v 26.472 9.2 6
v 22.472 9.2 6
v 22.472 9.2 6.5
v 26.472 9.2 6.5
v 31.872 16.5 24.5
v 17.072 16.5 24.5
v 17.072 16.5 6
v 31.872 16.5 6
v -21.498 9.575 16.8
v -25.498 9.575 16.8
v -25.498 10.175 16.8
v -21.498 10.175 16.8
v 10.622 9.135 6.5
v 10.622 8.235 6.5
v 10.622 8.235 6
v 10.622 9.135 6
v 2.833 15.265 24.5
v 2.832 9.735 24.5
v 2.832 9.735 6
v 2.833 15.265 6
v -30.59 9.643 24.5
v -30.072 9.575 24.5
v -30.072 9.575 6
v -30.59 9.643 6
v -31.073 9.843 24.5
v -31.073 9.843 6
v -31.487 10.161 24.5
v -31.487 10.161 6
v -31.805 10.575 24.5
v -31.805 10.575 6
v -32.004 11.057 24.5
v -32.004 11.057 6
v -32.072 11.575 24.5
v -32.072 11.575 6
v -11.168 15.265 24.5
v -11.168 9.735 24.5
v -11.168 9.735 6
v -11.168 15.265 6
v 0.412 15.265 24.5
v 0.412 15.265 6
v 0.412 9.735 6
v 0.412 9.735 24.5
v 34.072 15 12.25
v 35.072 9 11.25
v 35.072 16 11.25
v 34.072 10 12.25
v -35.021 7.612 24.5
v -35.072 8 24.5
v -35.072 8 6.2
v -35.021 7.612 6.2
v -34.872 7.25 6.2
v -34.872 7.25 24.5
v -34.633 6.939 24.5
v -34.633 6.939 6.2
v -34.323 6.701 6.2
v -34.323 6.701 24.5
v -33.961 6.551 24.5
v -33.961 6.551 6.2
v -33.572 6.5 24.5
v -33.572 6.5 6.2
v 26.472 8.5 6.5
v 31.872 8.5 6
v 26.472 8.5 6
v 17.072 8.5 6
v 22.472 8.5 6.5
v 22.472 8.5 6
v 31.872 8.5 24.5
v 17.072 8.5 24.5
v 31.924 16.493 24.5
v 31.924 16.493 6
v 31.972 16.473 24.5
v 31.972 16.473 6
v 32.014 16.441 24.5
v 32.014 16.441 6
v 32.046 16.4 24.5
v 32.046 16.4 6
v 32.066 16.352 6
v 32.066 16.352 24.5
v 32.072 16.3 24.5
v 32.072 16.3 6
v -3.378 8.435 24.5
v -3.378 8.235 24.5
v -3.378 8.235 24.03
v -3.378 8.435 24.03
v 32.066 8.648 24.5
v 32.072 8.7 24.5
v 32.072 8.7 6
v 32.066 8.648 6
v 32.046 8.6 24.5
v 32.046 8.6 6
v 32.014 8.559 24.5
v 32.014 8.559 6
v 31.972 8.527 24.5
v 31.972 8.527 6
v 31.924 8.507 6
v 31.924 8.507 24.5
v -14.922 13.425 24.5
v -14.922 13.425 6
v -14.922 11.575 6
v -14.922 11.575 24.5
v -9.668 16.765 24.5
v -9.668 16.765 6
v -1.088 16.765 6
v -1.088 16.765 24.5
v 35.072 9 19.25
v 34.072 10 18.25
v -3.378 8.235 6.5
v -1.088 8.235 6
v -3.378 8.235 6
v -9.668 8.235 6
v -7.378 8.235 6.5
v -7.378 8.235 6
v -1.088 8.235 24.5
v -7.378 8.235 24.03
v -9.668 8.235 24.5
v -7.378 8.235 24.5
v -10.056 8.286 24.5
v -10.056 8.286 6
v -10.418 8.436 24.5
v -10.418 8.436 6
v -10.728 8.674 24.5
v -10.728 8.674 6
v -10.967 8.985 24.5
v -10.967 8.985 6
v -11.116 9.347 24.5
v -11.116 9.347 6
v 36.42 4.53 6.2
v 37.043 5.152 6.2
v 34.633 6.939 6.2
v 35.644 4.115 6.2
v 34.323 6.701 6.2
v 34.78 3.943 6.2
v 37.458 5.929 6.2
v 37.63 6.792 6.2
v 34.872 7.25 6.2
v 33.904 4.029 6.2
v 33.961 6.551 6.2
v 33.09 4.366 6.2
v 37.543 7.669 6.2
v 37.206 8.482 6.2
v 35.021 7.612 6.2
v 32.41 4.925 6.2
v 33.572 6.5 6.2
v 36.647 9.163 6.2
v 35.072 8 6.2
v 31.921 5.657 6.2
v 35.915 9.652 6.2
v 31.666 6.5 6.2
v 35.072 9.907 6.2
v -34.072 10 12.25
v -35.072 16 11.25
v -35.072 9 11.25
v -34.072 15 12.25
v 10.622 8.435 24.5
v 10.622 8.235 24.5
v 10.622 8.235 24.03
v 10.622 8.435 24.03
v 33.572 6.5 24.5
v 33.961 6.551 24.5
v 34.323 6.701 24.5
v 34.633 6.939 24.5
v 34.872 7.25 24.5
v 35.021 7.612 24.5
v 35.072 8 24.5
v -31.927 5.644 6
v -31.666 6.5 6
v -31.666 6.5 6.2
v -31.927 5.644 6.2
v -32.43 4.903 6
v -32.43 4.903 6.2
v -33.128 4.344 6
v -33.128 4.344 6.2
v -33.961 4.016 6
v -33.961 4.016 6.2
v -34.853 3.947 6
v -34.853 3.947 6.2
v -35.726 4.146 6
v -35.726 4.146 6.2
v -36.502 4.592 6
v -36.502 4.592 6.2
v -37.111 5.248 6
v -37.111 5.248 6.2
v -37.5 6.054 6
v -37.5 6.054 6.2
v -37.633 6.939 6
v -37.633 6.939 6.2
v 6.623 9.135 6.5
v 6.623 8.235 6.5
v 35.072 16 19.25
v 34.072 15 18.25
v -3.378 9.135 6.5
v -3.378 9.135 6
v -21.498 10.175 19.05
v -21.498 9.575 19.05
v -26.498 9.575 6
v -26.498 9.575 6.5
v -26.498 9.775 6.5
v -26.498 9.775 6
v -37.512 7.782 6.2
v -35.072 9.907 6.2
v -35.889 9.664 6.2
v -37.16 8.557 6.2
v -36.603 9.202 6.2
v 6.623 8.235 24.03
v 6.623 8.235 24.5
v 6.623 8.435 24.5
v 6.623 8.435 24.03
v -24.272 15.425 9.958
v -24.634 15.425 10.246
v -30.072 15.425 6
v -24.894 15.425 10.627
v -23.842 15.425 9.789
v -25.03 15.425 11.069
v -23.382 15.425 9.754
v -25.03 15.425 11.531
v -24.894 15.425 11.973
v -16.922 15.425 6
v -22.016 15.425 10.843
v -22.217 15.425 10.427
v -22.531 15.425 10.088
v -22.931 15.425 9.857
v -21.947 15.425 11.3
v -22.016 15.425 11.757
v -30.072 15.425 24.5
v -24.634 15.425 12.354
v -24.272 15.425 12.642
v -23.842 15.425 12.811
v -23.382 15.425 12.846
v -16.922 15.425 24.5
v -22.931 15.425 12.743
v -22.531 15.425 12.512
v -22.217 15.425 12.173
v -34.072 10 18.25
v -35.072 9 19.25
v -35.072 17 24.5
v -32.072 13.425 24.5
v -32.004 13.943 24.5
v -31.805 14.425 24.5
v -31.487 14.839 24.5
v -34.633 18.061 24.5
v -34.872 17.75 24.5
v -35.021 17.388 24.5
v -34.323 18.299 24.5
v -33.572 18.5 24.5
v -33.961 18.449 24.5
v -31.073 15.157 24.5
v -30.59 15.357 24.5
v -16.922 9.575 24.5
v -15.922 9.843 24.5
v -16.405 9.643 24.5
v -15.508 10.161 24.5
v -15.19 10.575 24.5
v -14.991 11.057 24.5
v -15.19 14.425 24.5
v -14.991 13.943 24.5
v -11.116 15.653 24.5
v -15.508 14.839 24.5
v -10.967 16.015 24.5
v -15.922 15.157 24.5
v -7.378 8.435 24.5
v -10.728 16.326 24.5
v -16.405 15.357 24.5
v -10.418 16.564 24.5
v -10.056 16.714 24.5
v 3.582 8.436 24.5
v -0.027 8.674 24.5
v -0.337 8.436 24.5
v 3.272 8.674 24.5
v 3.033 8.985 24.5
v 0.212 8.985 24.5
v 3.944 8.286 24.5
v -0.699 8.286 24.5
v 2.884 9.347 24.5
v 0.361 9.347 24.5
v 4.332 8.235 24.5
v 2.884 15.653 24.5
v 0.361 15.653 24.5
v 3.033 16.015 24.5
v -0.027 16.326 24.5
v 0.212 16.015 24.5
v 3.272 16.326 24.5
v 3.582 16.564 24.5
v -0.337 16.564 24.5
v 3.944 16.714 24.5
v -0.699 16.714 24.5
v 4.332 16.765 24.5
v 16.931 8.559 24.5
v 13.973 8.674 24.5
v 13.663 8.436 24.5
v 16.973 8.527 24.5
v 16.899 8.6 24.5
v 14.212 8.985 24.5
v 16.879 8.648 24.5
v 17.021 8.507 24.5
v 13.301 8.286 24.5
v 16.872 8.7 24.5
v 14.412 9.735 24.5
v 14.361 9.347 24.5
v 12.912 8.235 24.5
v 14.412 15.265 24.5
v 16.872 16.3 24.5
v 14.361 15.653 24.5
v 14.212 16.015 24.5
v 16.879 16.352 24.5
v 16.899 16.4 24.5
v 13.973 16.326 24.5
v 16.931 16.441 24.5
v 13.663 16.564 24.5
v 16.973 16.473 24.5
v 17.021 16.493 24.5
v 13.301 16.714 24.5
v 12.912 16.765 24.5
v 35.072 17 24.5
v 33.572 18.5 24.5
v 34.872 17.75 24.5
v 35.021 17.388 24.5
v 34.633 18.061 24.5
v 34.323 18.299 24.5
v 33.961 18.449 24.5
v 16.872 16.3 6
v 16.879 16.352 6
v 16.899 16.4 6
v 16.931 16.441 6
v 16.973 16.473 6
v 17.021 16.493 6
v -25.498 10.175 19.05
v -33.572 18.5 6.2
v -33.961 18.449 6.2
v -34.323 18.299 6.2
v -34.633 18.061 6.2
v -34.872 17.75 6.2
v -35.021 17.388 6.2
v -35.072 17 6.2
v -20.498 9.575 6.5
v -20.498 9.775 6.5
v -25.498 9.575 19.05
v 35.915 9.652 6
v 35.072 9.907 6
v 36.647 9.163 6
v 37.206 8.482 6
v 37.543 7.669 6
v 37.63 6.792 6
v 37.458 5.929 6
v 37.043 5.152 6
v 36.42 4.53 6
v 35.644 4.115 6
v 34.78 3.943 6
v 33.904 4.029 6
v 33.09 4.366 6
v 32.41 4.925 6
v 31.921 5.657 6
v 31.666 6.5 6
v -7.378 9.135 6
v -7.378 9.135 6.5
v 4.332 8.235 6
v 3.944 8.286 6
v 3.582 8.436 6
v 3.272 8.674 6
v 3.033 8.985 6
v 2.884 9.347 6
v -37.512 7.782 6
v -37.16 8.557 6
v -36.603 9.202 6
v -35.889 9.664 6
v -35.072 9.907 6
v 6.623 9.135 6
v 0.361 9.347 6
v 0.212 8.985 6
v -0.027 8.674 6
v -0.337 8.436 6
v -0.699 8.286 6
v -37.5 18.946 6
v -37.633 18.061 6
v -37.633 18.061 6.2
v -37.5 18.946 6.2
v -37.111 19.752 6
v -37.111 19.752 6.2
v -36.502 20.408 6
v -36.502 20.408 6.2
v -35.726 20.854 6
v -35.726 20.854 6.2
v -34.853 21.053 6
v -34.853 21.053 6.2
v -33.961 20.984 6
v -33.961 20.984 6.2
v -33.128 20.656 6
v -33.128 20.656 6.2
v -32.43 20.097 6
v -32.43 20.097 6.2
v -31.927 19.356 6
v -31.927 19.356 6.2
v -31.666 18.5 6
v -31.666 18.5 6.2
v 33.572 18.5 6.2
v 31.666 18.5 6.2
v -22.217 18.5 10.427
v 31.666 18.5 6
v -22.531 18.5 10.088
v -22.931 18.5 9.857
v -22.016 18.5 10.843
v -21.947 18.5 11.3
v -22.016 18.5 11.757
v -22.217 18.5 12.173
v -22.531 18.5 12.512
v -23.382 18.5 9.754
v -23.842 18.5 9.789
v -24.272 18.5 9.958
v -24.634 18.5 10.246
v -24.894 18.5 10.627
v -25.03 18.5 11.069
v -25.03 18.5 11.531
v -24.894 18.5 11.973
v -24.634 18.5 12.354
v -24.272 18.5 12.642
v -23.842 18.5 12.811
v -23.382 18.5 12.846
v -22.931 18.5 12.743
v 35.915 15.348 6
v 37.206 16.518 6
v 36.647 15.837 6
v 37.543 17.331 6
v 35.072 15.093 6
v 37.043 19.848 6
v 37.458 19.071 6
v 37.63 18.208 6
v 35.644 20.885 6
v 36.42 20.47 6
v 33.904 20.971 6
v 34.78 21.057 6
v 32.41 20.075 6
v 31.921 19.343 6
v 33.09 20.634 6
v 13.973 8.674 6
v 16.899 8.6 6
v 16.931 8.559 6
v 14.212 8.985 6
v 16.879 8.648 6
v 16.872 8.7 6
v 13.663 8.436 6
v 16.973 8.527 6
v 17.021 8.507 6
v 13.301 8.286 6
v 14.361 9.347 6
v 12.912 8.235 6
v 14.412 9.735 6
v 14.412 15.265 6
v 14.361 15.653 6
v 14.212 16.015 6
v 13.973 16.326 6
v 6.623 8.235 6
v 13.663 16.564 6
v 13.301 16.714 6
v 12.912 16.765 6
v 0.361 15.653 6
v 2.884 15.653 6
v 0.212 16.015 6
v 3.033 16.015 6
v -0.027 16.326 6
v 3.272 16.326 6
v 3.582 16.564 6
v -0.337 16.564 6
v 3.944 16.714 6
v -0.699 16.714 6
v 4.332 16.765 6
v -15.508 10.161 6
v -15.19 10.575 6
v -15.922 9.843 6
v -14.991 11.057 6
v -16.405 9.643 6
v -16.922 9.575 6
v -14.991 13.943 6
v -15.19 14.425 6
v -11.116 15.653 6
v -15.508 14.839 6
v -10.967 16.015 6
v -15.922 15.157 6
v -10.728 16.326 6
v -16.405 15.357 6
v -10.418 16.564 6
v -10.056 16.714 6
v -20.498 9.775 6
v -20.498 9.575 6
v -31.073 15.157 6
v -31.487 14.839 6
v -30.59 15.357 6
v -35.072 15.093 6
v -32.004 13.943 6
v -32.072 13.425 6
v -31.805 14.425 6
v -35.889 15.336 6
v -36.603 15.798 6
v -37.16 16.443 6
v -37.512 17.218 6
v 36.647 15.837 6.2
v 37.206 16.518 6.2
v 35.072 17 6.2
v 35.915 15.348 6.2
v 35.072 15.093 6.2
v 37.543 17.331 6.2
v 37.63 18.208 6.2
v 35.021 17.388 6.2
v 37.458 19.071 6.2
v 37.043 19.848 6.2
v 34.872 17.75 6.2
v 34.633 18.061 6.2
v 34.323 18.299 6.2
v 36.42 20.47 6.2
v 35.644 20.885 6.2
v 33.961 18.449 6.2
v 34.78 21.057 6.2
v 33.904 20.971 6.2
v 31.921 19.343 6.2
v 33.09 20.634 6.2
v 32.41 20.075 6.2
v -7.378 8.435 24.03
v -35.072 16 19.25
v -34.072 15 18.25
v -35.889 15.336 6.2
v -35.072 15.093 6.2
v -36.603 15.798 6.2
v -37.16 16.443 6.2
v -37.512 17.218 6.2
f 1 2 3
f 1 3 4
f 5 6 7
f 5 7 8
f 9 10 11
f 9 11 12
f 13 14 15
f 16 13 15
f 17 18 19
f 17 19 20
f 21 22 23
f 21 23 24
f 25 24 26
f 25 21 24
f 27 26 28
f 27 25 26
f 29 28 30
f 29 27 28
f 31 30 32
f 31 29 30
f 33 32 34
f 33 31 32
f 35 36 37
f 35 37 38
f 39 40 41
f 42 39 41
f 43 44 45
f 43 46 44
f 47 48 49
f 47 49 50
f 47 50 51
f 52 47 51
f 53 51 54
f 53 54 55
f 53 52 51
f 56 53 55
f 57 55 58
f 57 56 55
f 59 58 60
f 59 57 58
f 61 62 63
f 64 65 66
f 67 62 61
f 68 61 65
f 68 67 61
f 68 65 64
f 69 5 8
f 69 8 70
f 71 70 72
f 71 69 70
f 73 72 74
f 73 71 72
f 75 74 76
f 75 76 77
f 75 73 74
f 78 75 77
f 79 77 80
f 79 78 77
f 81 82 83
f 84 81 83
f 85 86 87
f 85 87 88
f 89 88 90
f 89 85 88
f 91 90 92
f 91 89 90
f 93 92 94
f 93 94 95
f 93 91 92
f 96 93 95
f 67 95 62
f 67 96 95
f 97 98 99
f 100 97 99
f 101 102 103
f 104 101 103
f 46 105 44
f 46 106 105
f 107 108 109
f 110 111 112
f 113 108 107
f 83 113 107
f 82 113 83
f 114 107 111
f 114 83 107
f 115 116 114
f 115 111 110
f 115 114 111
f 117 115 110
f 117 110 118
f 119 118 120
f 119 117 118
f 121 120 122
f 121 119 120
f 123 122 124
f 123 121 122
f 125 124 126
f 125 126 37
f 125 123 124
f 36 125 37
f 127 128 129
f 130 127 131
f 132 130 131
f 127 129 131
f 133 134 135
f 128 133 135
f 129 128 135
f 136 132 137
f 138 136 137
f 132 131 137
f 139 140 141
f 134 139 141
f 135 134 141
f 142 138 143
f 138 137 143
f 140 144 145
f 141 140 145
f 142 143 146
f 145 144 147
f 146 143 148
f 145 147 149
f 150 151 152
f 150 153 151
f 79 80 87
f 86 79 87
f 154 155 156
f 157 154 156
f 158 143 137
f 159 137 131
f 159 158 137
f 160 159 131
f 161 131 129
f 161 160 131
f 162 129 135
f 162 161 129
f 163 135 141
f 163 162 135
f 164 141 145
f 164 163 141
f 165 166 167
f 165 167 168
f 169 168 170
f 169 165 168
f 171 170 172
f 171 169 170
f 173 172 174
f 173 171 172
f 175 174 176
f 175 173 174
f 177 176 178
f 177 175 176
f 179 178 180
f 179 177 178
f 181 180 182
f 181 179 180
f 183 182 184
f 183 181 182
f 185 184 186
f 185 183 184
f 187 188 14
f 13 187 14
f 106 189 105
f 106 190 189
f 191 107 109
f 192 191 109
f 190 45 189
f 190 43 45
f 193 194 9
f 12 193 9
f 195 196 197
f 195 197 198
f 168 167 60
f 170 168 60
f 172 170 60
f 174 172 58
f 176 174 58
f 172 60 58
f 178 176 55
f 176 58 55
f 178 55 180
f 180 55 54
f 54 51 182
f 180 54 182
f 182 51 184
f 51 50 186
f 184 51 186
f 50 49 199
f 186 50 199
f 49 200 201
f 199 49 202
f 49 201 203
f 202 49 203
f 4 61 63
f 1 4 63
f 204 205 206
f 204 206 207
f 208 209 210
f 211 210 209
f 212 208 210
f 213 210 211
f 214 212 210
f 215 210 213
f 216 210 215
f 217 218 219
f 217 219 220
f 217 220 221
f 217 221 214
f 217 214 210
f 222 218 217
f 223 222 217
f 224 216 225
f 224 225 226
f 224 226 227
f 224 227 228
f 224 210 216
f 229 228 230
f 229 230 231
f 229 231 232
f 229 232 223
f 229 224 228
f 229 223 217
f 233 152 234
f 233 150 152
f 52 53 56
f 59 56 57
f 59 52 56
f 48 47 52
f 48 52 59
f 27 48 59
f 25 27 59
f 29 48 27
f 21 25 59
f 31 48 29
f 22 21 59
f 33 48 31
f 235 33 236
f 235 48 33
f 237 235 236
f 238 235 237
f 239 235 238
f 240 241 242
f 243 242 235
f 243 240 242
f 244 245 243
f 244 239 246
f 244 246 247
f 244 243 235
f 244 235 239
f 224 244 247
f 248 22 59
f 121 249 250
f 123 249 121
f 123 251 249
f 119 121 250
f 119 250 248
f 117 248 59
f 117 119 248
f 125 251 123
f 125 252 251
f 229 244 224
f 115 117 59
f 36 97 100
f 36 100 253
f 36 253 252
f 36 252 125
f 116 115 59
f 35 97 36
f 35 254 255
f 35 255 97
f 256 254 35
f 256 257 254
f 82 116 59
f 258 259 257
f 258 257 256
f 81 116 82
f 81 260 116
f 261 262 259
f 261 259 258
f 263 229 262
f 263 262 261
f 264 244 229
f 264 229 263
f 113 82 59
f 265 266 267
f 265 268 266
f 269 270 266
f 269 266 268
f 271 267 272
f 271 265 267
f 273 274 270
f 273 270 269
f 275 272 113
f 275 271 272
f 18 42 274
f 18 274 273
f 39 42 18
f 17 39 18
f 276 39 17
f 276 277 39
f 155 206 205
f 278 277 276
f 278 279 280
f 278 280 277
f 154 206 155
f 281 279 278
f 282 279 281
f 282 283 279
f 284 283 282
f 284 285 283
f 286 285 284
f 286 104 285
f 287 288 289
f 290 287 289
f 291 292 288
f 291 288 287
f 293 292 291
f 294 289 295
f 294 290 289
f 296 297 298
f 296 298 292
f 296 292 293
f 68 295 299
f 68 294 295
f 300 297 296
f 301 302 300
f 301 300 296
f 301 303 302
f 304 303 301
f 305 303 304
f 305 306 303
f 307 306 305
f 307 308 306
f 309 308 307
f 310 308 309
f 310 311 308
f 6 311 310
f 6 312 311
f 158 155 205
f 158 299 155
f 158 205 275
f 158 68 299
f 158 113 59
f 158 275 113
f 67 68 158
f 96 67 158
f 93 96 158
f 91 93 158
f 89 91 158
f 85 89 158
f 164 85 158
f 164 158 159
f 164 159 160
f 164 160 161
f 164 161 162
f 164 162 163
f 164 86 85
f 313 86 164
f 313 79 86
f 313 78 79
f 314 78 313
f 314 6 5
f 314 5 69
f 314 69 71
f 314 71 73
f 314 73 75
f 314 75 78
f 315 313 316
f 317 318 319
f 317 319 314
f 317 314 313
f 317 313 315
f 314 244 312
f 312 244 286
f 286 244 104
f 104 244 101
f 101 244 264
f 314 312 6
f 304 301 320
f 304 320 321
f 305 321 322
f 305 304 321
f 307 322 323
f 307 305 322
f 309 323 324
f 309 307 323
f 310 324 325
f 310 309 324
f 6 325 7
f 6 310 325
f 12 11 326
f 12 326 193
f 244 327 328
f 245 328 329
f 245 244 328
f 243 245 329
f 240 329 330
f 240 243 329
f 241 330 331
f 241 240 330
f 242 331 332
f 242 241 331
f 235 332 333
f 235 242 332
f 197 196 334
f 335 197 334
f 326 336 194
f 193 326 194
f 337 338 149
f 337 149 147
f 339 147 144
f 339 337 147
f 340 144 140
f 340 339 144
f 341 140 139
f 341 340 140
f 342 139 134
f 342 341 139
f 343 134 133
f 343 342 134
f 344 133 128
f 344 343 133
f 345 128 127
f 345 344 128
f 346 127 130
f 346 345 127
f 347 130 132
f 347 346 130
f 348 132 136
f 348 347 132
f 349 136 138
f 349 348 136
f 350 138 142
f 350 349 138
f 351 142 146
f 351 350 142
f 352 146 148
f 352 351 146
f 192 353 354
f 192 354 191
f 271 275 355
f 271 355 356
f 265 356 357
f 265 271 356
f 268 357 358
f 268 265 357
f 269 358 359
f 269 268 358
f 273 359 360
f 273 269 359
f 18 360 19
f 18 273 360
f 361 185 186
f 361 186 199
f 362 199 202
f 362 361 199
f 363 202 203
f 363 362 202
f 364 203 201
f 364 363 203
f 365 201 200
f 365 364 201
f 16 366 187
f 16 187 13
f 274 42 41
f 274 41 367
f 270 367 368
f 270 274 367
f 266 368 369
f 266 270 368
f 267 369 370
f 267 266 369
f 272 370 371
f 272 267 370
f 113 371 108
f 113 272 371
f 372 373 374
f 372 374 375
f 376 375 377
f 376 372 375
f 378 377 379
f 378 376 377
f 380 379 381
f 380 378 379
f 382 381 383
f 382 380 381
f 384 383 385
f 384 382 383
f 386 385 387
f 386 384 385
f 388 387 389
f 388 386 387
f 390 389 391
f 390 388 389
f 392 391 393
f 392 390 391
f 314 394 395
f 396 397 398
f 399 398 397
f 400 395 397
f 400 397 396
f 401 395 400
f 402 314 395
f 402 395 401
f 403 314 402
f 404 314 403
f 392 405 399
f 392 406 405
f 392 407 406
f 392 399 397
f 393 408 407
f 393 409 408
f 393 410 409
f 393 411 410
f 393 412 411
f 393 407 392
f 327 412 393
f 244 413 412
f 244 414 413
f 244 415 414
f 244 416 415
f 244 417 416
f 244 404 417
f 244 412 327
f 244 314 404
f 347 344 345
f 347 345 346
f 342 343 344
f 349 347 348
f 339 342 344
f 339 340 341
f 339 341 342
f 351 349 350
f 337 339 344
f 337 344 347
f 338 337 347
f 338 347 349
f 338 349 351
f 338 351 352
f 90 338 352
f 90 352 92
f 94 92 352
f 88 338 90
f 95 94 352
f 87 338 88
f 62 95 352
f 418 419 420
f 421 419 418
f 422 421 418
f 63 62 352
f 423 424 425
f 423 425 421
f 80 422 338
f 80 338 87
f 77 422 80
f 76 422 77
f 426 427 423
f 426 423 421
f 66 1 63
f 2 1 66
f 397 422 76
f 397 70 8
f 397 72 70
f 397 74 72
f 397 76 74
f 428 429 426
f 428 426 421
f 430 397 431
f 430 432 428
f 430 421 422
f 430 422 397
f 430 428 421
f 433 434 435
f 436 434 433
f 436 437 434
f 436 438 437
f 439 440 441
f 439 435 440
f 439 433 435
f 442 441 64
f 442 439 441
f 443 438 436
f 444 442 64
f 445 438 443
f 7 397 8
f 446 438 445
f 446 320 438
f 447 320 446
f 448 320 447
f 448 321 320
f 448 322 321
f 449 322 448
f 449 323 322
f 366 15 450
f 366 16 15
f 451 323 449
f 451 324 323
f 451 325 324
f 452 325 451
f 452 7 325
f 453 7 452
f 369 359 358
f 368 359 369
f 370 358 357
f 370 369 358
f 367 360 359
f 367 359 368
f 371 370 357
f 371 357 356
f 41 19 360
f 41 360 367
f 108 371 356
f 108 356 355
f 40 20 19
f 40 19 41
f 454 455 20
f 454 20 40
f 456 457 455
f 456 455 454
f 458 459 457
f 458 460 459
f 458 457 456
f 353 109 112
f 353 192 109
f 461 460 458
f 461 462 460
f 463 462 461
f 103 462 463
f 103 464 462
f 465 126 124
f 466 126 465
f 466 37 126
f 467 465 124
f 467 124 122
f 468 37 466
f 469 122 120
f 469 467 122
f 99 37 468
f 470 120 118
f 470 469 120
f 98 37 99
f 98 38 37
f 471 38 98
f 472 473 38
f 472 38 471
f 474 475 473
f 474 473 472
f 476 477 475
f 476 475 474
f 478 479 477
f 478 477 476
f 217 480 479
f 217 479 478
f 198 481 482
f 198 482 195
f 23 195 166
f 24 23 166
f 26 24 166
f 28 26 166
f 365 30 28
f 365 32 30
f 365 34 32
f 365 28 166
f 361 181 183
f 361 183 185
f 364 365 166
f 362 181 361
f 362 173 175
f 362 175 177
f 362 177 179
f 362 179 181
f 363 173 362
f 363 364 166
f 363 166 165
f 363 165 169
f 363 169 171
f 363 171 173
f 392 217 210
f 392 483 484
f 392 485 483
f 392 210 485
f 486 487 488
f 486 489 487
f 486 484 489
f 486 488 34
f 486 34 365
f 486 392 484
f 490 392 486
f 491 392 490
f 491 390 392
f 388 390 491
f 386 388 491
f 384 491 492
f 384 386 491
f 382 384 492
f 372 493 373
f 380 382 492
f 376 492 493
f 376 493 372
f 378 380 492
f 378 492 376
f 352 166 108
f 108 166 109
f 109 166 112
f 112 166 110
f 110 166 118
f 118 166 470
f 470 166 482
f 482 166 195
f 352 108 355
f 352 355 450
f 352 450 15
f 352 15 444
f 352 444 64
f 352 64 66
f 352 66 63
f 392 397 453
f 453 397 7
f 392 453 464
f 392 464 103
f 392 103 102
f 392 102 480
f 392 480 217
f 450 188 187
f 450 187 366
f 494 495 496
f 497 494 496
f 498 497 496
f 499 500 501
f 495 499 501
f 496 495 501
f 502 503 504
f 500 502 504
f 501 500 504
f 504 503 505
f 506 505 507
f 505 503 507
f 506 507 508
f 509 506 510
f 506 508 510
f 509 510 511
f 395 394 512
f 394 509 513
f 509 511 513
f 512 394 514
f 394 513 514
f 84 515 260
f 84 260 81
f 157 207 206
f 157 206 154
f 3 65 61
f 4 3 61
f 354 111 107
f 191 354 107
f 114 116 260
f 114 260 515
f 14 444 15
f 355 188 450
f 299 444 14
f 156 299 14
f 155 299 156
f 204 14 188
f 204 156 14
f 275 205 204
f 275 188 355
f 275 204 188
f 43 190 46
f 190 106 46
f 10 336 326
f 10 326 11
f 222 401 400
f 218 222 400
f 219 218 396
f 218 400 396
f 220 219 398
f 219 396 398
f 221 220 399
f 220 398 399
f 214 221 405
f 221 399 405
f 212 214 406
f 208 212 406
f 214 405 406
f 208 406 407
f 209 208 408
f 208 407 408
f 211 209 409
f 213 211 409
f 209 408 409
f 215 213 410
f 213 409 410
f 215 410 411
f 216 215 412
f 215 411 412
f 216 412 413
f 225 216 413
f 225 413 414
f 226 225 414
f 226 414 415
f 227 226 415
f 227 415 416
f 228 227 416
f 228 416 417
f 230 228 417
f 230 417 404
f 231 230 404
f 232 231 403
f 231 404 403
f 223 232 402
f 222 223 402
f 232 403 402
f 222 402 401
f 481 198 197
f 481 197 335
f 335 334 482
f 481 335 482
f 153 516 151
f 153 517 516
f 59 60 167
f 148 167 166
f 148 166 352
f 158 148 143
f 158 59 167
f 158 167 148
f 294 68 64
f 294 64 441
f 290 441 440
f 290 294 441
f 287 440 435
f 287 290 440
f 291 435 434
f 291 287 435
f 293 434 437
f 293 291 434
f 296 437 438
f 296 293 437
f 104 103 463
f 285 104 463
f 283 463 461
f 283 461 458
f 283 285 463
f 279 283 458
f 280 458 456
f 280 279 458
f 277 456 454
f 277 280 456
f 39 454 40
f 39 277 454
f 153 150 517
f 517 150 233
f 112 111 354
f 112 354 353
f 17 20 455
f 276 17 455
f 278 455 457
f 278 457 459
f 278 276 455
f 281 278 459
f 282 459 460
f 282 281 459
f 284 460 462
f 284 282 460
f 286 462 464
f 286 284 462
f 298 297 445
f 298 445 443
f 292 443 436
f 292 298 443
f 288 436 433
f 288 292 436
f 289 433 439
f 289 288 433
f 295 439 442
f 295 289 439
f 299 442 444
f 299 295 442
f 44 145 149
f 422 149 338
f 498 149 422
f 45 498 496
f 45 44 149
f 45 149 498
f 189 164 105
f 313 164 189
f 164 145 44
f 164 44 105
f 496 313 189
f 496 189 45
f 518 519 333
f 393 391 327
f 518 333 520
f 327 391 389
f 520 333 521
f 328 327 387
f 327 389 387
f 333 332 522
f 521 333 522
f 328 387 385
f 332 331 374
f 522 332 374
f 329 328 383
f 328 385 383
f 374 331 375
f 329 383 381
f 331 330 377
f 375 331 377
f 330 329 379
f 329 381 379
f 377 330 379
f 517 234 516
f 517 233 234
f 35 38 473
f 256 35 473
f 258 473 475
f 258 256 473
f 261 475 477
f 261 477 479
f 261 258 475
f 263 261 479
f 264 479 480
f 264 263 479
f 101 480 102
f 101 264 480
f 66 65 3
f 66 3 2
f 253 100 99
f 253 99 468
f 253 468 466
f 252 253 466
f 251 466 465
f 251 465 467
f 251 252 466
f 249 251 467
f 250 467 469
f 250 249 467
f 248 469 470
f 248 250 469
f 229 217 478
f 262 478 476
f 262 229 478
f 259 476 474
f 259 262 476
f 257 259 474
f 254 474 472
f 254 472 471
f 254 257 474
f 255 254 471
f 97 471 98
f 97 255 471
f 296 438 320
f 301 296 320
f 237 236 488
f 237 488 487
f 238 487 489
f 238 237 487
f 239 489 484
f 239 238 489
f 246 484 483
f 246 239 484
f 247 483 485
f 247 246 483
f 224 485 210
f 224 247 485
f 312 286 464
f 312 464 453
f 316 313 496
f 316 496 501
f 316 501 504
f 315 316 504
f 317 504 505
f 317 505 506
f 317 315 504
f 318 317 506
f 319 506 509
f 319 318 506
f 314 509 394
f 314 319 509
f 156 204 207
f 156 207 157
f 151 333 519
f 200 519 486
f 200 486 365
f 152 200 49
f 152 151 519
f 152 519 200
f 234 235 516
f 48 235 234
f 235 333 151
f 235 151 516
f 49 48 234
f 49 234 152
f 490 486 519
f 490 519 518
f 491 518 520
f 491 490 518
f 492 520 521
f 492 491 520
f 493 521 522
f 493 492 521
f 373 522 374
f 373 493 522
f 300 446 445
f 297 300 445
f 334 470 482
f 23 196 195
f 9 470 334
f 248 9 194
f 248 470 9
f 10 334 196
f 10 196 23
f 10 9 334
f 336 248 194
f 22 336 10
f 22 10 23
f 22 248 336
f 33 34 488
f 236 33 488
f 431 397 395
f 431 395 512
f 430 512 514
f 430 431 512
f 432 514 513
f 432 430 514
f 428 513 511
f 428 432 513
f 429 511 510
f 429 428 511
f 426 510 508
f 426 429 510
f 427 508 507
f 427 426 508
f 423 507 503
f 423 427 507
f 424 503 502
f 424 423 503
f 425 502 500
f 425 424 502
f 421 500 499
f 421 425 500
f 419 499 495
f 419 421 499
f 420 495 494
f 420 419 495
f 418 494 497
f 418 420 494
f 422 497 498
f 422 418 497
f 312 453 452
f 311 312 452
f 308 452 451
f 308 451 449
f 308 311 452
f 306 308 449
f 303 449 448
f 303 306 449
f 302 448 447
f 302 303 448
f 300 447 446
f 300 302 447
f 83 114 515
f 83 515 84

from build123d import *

# Parameters (mm, degrees)
F2_DEPTH  = 18.5
F3_R      = 1.55
F4_DEPTH  = 3.075
F5_W      = 6
F5_H      = 0.5
F6_DEPTH  = 0.2
F5_W_2    = 4
F5_H_2    = 2.25
F7_DEPTH  = 0.6
F8_W      = 4
F8_H      = 0.5
F9_DEPTH  = 0.9
F8_H_2    = 0.47
F10_DEPTH = 0.2
F11_W     = 4
F11_H     = 0.5
F12_DEPTH = 0.9
F11_H_2   = 0.47
F13_DEPTH = 0.2
F14_W     = 4
F14_H     = 0.5
F15_DEPTH = 0.7
F16_W     = 8
F16_H     = 7
F17_DEPTH = 1
F17_TAPER = 45
F18_W     = 8
F18_H     = 7
F19_DEPTH = 1
F19_TAPER = 45
F22_DEPTH = 0.2
F23_ANGLE = 90


with BuildPart() as f2:
    # F1 (on Front) → F2 (new body)
    with BuildSketch(Plane.XZ):
        with BuildLine():
            Line((-33.5725, -6), (33.5725, -6))
            ThreePointArc((33.5725, -6), (34.6331601718, -5.5606601718), (35.0725, -4.5))
            Line((35.0725, -4.5), (35.0725, 4.5))
            ThreePointArc((35.0725, 4.5), (34.6331601718, 5.5606601718), (33.5725, 6))
            Line((33.5725, 6), (-33.5725, 6))
            ThreePointArc((-33.5725, 6), (-34.6331601718, 5.5606601718), (-35.0725, 4.5))
            Line((-35.0725, 4.5), (-35.0725, -4.5))
            ThreePointArc((-35.0725, -4.5), (-34.6331601718, -5.5606601718), (-33.5725, -6))
        make_face()
        with BuildLine():
            ThreePointArc((-14.9225, -0.925), (-15.5082864376, -2.3392135624), (-16.9225, -2.925))
            Line((-16.9225, -2.925), (-30.0725, -2.925))
            ThreePointArc((-30.0725, -2.925), (-31.4867135624, -2.3392135624), (-32.0725, -0.925))
            Line((-32.0725, -0.925), (-32.0725, 0.925))
            ThreePointArc((-32.0725, 0.925), (-31.4867135624, 2.3392135624), (-30.0725, 2.925))
            Line((-30.0725, 2.925), (-16.9225, 2.925))
            ThreePointArc((-16.9225, 2.925), (-15.5082864376, 2.3392135624), (-14.9225, 0.925))
            Line((-14.9225, 0.925), (-14.9225, -0.925))
        make_face(mode=Mode.SUBTRACT)
        with BuildLine():
            Line((-9.6675, 4.265), (-1.0875, 4.265))
            ThreePointArc((-1.0875, 4.265), (-0.0268398282, 3.8256601718), (0.4125, 2.765))
            Line((0.4125, 2.765), (0.4125, -2.765))
            ThreePointArc((0.4125, -2.765), (-0.0268398282, -3.8256601718), (-1.0875, -4.265))
            Line((-1.0875, -4.265), (-9.6675, -4.265))
            ThreePointArc((-9.6675, -4.265), (-10.7281601718, -3.8256601718), (-11.1675, -2.765))
            Line((-11.1675, -2.765), (-11.1675, 2.765))
            ThreePointArc((-11.1675, 2.765), (-10.7281601718, 3.8256601718), (-9.6675, 4.265))
        make_face(mode=Mode.SUBTRACT)
        with BuildLine():
            Line((4.3325, 4.265), (12.9125, 4.265))
            ThreePointArc((12.9125, 4.265), (13.9731601718, 3.8256601718), (14.4125, 2.765))
            Line((14.4125, 2.765), (14.4125, -2.765))
            ThreePointArc((14.4125, -2.765), (13.9731601718, -3.8256601718), (12.9125, -4.265))
            Line((12.9125, -4.265), (4.3325, -4.265))
            ThreePointArc((4.3325, -4.265), (3.2718398282, -3.8256601718), (2.8325, -2.765))
            Line((2.8325, -2.765), (2.8325, 2.765))
            ThreePointArc((2.8325, 2.765), (3.2718398282, 3.8256601718), (4.3325, 4.265))
        make_face(mode=Mode.SUBTRACT)
        with BuildLine():
            ThreePointArc((32.0725, -3.8), (32.0139213562, -3.9414213562), (31.8725, -4))
            Line((31.8725, -4), (17.0725, -4))
            ThreePointArc((17.0725, -4), (16.9310786438, -3.9414213562), (16.8725, -3.8))
            Line((16.8725, -3.8), (16.8725, 3.8))
            ThreePointArc((16.8725, 3.8), (16.9310786438, 3.9414213562), (17.0725, 4))
            Line((17.0725, 4), (31.8725, 4))
            ThreePointArc((31.8725, 4), (32.0139213562, 3.9414213562), (32.0725, 3.8))
            Line((32.0725, 3.8), (32.0725, -3.8))
        make_face(mode=Mode.SUBTRACT)
    extrude(amount=-F2_DEPTH)

    # F3 (on face) → F4 (cut, through all)
    with BuildSketch(Plane.XY.offset(6)):
        with Locations((-23.4975, 13.2)):
            Circle(F3_R)
    extrude(amount=-F4_DEPTH, mode=Mode.SUBTRACT)

    # F5 (on face) → F6 (join)
    with BuildSketch(Plane.XY.offset(-2.925)):
        with Locations((-23.4975, 18.25)):
            Rectangle(F5_W, F5_H)
    extrude(amount=F6_DEPTH)

    # F5 (on face) → F7 (join)
    with BuildSketch(Plane.XY.offset(-2.925)):
        with Locations((-23.4975, 6.575)):
            Rectangle(F5_W_2, F5_H_2)
    extrude(amount=F7_DEPTH)

    # F8 (on face) → F9 (join)
    with BuildSketch(Plane.XY.offset(-4.265)):
        with Locations((-5.3775, 18.25)):
            Rectangle(F8_W, F8_H)
    extrude(amount=F9_DEPTH)

    # F8 (on face) → F10 (join)
    with BuildSketch(Plane.XY.offset(-4.265)):
        with Locations((-5.3775, 0.235)):
            Rectangle(F8_W, F8_H_2)
    extrude(amount=F10_DEPTH)

    # F11 (on face) → F12 (join)
    with BuildSketch(Plane.XY.offset(-4.265)):
        with Locations((8.6225, 18.25)):
            Rectangle(F11_W, F11_H)
    extrude(amount=F12_DEPTH)

    # F11 (on face) → F13 (join)
    with BuildSketch(Plane.XY.offset(-4.265)):
        with Locations((8.6225, 0.235)):
            Rectangle(F11_W, F11_H_2)
    extrude(amount=F13_DEPTH)

    # F14 (on face) → F15 (join)
    with BuildSketch(Plane.XY.offset(-4)):
        with Locations((24.4725, 18.25)):
            Rectangle(F14_W, F14_H)
    extrude(amount=F15_DEPTH)

    # F16 (on face) → F17 (cut)
    with BuildSketch(Plane.YZ.offset(35.0725)):
        with Locations((9.25, 0)):
            Rectangle(F16_W, F16_H)
    extrude(amount=-F17_DEPTH, taper=F17_TAPER, mode=Mode.SUBTRACT)

    # F18 (on face) → F19 (cut)
    with BuildSketch(Plane(origin=(-35.0725, 0, 0), x_dir=(0, -1, 0), z_dir=(-1, 0, 0))):
        with Locations((-9.25, 0)):
            Rectangle(F18_W, F18_H)
    extrude(amount=-F19_DEPTH, taper=F19_TAPER, mode=Mode.SUBTRACT)

    # F21 (on face) → F22 (join)
    with BuildSketch(Plane(origin=(0, 18.5, 0), x_dir=(-1, 0, 0), z_dir=(0, 1, 0))):
        with BuildLine():
            Line((-33.5725, 6), (-31.6655044446, 6))
            ThreePointArc((-31.6655044446, 6), (-36.7544805153, 7.6819805153), (-35.0725, 2.5930044446))
            Line((-35.0725, 2.5930044446), (-35.0725, 4.5))
            ThreePointArc((-35.0725, 4.5), (-34.6331601718, 5.5606601718), (-33.5725, 6))
        make_face()
        with BuildLine():
            Line((-35.0725, -4.5), (-35.0725, -2.5930044446))
            ThreePointArc((-35.0725, -2.5930044446), (-36.7544805153, -7.6819805153), (-31.6655044446, -6))
            Line((-31.6655044446, -6), (-33.5725, -6))
            ThreePointArc((-33.5725, -6), (-34.6331601718, -5.5606601718), (-35.0725, -4.5))
        make_face()
        with BuildLine():
            ThreePointArc((37.6331601718, 5.5606601718), (34.8534245792, 8.5525631767), (31.6655044446, 6))
            Line((31.6655044446, 6), (33.5725, 6))
            ThreePointArc((33.5725, 6), (34.6331601718, 5.5606601718), (35.0725, 4.5))
            Line((35.0725, 4.5), (35.0725, 2.5930044446))
            ThreePointArc((35.0725, 2.5930044446), (36.9045055313, 3.6008157245), (37.6331601718, 5.5606601718))
        make_face()
        with BuildLine():
            ThreePointArc((37.6331601718, -5.5606601718), (36.9045055313, -3.6008157245), (35.0725, -2.5930044446))
            Line((35.0725, -2.5930044446), (35.0725, -4.5))
            ThreePointArc((35.0725, -4.5), (34.6331601718, -5.5606601718), (33.5725, -6))
            Line((33.5725, -6), (31.6655044446, -6))
            ThreePointArc((31.6655044446, -6), (34.8534245792, -8.5525631767), (37.6331601718, -5.5606601718))
        make_face()
    extrude(amount=-F22_DEPTH)


with BuildPart() as f2_1:
    # F23: moved
    add(f2.part.rotate(Axis((0, 18.5, 6), (-1, 0, 0)), F23_ANGLE))


solid = f2_1.part
